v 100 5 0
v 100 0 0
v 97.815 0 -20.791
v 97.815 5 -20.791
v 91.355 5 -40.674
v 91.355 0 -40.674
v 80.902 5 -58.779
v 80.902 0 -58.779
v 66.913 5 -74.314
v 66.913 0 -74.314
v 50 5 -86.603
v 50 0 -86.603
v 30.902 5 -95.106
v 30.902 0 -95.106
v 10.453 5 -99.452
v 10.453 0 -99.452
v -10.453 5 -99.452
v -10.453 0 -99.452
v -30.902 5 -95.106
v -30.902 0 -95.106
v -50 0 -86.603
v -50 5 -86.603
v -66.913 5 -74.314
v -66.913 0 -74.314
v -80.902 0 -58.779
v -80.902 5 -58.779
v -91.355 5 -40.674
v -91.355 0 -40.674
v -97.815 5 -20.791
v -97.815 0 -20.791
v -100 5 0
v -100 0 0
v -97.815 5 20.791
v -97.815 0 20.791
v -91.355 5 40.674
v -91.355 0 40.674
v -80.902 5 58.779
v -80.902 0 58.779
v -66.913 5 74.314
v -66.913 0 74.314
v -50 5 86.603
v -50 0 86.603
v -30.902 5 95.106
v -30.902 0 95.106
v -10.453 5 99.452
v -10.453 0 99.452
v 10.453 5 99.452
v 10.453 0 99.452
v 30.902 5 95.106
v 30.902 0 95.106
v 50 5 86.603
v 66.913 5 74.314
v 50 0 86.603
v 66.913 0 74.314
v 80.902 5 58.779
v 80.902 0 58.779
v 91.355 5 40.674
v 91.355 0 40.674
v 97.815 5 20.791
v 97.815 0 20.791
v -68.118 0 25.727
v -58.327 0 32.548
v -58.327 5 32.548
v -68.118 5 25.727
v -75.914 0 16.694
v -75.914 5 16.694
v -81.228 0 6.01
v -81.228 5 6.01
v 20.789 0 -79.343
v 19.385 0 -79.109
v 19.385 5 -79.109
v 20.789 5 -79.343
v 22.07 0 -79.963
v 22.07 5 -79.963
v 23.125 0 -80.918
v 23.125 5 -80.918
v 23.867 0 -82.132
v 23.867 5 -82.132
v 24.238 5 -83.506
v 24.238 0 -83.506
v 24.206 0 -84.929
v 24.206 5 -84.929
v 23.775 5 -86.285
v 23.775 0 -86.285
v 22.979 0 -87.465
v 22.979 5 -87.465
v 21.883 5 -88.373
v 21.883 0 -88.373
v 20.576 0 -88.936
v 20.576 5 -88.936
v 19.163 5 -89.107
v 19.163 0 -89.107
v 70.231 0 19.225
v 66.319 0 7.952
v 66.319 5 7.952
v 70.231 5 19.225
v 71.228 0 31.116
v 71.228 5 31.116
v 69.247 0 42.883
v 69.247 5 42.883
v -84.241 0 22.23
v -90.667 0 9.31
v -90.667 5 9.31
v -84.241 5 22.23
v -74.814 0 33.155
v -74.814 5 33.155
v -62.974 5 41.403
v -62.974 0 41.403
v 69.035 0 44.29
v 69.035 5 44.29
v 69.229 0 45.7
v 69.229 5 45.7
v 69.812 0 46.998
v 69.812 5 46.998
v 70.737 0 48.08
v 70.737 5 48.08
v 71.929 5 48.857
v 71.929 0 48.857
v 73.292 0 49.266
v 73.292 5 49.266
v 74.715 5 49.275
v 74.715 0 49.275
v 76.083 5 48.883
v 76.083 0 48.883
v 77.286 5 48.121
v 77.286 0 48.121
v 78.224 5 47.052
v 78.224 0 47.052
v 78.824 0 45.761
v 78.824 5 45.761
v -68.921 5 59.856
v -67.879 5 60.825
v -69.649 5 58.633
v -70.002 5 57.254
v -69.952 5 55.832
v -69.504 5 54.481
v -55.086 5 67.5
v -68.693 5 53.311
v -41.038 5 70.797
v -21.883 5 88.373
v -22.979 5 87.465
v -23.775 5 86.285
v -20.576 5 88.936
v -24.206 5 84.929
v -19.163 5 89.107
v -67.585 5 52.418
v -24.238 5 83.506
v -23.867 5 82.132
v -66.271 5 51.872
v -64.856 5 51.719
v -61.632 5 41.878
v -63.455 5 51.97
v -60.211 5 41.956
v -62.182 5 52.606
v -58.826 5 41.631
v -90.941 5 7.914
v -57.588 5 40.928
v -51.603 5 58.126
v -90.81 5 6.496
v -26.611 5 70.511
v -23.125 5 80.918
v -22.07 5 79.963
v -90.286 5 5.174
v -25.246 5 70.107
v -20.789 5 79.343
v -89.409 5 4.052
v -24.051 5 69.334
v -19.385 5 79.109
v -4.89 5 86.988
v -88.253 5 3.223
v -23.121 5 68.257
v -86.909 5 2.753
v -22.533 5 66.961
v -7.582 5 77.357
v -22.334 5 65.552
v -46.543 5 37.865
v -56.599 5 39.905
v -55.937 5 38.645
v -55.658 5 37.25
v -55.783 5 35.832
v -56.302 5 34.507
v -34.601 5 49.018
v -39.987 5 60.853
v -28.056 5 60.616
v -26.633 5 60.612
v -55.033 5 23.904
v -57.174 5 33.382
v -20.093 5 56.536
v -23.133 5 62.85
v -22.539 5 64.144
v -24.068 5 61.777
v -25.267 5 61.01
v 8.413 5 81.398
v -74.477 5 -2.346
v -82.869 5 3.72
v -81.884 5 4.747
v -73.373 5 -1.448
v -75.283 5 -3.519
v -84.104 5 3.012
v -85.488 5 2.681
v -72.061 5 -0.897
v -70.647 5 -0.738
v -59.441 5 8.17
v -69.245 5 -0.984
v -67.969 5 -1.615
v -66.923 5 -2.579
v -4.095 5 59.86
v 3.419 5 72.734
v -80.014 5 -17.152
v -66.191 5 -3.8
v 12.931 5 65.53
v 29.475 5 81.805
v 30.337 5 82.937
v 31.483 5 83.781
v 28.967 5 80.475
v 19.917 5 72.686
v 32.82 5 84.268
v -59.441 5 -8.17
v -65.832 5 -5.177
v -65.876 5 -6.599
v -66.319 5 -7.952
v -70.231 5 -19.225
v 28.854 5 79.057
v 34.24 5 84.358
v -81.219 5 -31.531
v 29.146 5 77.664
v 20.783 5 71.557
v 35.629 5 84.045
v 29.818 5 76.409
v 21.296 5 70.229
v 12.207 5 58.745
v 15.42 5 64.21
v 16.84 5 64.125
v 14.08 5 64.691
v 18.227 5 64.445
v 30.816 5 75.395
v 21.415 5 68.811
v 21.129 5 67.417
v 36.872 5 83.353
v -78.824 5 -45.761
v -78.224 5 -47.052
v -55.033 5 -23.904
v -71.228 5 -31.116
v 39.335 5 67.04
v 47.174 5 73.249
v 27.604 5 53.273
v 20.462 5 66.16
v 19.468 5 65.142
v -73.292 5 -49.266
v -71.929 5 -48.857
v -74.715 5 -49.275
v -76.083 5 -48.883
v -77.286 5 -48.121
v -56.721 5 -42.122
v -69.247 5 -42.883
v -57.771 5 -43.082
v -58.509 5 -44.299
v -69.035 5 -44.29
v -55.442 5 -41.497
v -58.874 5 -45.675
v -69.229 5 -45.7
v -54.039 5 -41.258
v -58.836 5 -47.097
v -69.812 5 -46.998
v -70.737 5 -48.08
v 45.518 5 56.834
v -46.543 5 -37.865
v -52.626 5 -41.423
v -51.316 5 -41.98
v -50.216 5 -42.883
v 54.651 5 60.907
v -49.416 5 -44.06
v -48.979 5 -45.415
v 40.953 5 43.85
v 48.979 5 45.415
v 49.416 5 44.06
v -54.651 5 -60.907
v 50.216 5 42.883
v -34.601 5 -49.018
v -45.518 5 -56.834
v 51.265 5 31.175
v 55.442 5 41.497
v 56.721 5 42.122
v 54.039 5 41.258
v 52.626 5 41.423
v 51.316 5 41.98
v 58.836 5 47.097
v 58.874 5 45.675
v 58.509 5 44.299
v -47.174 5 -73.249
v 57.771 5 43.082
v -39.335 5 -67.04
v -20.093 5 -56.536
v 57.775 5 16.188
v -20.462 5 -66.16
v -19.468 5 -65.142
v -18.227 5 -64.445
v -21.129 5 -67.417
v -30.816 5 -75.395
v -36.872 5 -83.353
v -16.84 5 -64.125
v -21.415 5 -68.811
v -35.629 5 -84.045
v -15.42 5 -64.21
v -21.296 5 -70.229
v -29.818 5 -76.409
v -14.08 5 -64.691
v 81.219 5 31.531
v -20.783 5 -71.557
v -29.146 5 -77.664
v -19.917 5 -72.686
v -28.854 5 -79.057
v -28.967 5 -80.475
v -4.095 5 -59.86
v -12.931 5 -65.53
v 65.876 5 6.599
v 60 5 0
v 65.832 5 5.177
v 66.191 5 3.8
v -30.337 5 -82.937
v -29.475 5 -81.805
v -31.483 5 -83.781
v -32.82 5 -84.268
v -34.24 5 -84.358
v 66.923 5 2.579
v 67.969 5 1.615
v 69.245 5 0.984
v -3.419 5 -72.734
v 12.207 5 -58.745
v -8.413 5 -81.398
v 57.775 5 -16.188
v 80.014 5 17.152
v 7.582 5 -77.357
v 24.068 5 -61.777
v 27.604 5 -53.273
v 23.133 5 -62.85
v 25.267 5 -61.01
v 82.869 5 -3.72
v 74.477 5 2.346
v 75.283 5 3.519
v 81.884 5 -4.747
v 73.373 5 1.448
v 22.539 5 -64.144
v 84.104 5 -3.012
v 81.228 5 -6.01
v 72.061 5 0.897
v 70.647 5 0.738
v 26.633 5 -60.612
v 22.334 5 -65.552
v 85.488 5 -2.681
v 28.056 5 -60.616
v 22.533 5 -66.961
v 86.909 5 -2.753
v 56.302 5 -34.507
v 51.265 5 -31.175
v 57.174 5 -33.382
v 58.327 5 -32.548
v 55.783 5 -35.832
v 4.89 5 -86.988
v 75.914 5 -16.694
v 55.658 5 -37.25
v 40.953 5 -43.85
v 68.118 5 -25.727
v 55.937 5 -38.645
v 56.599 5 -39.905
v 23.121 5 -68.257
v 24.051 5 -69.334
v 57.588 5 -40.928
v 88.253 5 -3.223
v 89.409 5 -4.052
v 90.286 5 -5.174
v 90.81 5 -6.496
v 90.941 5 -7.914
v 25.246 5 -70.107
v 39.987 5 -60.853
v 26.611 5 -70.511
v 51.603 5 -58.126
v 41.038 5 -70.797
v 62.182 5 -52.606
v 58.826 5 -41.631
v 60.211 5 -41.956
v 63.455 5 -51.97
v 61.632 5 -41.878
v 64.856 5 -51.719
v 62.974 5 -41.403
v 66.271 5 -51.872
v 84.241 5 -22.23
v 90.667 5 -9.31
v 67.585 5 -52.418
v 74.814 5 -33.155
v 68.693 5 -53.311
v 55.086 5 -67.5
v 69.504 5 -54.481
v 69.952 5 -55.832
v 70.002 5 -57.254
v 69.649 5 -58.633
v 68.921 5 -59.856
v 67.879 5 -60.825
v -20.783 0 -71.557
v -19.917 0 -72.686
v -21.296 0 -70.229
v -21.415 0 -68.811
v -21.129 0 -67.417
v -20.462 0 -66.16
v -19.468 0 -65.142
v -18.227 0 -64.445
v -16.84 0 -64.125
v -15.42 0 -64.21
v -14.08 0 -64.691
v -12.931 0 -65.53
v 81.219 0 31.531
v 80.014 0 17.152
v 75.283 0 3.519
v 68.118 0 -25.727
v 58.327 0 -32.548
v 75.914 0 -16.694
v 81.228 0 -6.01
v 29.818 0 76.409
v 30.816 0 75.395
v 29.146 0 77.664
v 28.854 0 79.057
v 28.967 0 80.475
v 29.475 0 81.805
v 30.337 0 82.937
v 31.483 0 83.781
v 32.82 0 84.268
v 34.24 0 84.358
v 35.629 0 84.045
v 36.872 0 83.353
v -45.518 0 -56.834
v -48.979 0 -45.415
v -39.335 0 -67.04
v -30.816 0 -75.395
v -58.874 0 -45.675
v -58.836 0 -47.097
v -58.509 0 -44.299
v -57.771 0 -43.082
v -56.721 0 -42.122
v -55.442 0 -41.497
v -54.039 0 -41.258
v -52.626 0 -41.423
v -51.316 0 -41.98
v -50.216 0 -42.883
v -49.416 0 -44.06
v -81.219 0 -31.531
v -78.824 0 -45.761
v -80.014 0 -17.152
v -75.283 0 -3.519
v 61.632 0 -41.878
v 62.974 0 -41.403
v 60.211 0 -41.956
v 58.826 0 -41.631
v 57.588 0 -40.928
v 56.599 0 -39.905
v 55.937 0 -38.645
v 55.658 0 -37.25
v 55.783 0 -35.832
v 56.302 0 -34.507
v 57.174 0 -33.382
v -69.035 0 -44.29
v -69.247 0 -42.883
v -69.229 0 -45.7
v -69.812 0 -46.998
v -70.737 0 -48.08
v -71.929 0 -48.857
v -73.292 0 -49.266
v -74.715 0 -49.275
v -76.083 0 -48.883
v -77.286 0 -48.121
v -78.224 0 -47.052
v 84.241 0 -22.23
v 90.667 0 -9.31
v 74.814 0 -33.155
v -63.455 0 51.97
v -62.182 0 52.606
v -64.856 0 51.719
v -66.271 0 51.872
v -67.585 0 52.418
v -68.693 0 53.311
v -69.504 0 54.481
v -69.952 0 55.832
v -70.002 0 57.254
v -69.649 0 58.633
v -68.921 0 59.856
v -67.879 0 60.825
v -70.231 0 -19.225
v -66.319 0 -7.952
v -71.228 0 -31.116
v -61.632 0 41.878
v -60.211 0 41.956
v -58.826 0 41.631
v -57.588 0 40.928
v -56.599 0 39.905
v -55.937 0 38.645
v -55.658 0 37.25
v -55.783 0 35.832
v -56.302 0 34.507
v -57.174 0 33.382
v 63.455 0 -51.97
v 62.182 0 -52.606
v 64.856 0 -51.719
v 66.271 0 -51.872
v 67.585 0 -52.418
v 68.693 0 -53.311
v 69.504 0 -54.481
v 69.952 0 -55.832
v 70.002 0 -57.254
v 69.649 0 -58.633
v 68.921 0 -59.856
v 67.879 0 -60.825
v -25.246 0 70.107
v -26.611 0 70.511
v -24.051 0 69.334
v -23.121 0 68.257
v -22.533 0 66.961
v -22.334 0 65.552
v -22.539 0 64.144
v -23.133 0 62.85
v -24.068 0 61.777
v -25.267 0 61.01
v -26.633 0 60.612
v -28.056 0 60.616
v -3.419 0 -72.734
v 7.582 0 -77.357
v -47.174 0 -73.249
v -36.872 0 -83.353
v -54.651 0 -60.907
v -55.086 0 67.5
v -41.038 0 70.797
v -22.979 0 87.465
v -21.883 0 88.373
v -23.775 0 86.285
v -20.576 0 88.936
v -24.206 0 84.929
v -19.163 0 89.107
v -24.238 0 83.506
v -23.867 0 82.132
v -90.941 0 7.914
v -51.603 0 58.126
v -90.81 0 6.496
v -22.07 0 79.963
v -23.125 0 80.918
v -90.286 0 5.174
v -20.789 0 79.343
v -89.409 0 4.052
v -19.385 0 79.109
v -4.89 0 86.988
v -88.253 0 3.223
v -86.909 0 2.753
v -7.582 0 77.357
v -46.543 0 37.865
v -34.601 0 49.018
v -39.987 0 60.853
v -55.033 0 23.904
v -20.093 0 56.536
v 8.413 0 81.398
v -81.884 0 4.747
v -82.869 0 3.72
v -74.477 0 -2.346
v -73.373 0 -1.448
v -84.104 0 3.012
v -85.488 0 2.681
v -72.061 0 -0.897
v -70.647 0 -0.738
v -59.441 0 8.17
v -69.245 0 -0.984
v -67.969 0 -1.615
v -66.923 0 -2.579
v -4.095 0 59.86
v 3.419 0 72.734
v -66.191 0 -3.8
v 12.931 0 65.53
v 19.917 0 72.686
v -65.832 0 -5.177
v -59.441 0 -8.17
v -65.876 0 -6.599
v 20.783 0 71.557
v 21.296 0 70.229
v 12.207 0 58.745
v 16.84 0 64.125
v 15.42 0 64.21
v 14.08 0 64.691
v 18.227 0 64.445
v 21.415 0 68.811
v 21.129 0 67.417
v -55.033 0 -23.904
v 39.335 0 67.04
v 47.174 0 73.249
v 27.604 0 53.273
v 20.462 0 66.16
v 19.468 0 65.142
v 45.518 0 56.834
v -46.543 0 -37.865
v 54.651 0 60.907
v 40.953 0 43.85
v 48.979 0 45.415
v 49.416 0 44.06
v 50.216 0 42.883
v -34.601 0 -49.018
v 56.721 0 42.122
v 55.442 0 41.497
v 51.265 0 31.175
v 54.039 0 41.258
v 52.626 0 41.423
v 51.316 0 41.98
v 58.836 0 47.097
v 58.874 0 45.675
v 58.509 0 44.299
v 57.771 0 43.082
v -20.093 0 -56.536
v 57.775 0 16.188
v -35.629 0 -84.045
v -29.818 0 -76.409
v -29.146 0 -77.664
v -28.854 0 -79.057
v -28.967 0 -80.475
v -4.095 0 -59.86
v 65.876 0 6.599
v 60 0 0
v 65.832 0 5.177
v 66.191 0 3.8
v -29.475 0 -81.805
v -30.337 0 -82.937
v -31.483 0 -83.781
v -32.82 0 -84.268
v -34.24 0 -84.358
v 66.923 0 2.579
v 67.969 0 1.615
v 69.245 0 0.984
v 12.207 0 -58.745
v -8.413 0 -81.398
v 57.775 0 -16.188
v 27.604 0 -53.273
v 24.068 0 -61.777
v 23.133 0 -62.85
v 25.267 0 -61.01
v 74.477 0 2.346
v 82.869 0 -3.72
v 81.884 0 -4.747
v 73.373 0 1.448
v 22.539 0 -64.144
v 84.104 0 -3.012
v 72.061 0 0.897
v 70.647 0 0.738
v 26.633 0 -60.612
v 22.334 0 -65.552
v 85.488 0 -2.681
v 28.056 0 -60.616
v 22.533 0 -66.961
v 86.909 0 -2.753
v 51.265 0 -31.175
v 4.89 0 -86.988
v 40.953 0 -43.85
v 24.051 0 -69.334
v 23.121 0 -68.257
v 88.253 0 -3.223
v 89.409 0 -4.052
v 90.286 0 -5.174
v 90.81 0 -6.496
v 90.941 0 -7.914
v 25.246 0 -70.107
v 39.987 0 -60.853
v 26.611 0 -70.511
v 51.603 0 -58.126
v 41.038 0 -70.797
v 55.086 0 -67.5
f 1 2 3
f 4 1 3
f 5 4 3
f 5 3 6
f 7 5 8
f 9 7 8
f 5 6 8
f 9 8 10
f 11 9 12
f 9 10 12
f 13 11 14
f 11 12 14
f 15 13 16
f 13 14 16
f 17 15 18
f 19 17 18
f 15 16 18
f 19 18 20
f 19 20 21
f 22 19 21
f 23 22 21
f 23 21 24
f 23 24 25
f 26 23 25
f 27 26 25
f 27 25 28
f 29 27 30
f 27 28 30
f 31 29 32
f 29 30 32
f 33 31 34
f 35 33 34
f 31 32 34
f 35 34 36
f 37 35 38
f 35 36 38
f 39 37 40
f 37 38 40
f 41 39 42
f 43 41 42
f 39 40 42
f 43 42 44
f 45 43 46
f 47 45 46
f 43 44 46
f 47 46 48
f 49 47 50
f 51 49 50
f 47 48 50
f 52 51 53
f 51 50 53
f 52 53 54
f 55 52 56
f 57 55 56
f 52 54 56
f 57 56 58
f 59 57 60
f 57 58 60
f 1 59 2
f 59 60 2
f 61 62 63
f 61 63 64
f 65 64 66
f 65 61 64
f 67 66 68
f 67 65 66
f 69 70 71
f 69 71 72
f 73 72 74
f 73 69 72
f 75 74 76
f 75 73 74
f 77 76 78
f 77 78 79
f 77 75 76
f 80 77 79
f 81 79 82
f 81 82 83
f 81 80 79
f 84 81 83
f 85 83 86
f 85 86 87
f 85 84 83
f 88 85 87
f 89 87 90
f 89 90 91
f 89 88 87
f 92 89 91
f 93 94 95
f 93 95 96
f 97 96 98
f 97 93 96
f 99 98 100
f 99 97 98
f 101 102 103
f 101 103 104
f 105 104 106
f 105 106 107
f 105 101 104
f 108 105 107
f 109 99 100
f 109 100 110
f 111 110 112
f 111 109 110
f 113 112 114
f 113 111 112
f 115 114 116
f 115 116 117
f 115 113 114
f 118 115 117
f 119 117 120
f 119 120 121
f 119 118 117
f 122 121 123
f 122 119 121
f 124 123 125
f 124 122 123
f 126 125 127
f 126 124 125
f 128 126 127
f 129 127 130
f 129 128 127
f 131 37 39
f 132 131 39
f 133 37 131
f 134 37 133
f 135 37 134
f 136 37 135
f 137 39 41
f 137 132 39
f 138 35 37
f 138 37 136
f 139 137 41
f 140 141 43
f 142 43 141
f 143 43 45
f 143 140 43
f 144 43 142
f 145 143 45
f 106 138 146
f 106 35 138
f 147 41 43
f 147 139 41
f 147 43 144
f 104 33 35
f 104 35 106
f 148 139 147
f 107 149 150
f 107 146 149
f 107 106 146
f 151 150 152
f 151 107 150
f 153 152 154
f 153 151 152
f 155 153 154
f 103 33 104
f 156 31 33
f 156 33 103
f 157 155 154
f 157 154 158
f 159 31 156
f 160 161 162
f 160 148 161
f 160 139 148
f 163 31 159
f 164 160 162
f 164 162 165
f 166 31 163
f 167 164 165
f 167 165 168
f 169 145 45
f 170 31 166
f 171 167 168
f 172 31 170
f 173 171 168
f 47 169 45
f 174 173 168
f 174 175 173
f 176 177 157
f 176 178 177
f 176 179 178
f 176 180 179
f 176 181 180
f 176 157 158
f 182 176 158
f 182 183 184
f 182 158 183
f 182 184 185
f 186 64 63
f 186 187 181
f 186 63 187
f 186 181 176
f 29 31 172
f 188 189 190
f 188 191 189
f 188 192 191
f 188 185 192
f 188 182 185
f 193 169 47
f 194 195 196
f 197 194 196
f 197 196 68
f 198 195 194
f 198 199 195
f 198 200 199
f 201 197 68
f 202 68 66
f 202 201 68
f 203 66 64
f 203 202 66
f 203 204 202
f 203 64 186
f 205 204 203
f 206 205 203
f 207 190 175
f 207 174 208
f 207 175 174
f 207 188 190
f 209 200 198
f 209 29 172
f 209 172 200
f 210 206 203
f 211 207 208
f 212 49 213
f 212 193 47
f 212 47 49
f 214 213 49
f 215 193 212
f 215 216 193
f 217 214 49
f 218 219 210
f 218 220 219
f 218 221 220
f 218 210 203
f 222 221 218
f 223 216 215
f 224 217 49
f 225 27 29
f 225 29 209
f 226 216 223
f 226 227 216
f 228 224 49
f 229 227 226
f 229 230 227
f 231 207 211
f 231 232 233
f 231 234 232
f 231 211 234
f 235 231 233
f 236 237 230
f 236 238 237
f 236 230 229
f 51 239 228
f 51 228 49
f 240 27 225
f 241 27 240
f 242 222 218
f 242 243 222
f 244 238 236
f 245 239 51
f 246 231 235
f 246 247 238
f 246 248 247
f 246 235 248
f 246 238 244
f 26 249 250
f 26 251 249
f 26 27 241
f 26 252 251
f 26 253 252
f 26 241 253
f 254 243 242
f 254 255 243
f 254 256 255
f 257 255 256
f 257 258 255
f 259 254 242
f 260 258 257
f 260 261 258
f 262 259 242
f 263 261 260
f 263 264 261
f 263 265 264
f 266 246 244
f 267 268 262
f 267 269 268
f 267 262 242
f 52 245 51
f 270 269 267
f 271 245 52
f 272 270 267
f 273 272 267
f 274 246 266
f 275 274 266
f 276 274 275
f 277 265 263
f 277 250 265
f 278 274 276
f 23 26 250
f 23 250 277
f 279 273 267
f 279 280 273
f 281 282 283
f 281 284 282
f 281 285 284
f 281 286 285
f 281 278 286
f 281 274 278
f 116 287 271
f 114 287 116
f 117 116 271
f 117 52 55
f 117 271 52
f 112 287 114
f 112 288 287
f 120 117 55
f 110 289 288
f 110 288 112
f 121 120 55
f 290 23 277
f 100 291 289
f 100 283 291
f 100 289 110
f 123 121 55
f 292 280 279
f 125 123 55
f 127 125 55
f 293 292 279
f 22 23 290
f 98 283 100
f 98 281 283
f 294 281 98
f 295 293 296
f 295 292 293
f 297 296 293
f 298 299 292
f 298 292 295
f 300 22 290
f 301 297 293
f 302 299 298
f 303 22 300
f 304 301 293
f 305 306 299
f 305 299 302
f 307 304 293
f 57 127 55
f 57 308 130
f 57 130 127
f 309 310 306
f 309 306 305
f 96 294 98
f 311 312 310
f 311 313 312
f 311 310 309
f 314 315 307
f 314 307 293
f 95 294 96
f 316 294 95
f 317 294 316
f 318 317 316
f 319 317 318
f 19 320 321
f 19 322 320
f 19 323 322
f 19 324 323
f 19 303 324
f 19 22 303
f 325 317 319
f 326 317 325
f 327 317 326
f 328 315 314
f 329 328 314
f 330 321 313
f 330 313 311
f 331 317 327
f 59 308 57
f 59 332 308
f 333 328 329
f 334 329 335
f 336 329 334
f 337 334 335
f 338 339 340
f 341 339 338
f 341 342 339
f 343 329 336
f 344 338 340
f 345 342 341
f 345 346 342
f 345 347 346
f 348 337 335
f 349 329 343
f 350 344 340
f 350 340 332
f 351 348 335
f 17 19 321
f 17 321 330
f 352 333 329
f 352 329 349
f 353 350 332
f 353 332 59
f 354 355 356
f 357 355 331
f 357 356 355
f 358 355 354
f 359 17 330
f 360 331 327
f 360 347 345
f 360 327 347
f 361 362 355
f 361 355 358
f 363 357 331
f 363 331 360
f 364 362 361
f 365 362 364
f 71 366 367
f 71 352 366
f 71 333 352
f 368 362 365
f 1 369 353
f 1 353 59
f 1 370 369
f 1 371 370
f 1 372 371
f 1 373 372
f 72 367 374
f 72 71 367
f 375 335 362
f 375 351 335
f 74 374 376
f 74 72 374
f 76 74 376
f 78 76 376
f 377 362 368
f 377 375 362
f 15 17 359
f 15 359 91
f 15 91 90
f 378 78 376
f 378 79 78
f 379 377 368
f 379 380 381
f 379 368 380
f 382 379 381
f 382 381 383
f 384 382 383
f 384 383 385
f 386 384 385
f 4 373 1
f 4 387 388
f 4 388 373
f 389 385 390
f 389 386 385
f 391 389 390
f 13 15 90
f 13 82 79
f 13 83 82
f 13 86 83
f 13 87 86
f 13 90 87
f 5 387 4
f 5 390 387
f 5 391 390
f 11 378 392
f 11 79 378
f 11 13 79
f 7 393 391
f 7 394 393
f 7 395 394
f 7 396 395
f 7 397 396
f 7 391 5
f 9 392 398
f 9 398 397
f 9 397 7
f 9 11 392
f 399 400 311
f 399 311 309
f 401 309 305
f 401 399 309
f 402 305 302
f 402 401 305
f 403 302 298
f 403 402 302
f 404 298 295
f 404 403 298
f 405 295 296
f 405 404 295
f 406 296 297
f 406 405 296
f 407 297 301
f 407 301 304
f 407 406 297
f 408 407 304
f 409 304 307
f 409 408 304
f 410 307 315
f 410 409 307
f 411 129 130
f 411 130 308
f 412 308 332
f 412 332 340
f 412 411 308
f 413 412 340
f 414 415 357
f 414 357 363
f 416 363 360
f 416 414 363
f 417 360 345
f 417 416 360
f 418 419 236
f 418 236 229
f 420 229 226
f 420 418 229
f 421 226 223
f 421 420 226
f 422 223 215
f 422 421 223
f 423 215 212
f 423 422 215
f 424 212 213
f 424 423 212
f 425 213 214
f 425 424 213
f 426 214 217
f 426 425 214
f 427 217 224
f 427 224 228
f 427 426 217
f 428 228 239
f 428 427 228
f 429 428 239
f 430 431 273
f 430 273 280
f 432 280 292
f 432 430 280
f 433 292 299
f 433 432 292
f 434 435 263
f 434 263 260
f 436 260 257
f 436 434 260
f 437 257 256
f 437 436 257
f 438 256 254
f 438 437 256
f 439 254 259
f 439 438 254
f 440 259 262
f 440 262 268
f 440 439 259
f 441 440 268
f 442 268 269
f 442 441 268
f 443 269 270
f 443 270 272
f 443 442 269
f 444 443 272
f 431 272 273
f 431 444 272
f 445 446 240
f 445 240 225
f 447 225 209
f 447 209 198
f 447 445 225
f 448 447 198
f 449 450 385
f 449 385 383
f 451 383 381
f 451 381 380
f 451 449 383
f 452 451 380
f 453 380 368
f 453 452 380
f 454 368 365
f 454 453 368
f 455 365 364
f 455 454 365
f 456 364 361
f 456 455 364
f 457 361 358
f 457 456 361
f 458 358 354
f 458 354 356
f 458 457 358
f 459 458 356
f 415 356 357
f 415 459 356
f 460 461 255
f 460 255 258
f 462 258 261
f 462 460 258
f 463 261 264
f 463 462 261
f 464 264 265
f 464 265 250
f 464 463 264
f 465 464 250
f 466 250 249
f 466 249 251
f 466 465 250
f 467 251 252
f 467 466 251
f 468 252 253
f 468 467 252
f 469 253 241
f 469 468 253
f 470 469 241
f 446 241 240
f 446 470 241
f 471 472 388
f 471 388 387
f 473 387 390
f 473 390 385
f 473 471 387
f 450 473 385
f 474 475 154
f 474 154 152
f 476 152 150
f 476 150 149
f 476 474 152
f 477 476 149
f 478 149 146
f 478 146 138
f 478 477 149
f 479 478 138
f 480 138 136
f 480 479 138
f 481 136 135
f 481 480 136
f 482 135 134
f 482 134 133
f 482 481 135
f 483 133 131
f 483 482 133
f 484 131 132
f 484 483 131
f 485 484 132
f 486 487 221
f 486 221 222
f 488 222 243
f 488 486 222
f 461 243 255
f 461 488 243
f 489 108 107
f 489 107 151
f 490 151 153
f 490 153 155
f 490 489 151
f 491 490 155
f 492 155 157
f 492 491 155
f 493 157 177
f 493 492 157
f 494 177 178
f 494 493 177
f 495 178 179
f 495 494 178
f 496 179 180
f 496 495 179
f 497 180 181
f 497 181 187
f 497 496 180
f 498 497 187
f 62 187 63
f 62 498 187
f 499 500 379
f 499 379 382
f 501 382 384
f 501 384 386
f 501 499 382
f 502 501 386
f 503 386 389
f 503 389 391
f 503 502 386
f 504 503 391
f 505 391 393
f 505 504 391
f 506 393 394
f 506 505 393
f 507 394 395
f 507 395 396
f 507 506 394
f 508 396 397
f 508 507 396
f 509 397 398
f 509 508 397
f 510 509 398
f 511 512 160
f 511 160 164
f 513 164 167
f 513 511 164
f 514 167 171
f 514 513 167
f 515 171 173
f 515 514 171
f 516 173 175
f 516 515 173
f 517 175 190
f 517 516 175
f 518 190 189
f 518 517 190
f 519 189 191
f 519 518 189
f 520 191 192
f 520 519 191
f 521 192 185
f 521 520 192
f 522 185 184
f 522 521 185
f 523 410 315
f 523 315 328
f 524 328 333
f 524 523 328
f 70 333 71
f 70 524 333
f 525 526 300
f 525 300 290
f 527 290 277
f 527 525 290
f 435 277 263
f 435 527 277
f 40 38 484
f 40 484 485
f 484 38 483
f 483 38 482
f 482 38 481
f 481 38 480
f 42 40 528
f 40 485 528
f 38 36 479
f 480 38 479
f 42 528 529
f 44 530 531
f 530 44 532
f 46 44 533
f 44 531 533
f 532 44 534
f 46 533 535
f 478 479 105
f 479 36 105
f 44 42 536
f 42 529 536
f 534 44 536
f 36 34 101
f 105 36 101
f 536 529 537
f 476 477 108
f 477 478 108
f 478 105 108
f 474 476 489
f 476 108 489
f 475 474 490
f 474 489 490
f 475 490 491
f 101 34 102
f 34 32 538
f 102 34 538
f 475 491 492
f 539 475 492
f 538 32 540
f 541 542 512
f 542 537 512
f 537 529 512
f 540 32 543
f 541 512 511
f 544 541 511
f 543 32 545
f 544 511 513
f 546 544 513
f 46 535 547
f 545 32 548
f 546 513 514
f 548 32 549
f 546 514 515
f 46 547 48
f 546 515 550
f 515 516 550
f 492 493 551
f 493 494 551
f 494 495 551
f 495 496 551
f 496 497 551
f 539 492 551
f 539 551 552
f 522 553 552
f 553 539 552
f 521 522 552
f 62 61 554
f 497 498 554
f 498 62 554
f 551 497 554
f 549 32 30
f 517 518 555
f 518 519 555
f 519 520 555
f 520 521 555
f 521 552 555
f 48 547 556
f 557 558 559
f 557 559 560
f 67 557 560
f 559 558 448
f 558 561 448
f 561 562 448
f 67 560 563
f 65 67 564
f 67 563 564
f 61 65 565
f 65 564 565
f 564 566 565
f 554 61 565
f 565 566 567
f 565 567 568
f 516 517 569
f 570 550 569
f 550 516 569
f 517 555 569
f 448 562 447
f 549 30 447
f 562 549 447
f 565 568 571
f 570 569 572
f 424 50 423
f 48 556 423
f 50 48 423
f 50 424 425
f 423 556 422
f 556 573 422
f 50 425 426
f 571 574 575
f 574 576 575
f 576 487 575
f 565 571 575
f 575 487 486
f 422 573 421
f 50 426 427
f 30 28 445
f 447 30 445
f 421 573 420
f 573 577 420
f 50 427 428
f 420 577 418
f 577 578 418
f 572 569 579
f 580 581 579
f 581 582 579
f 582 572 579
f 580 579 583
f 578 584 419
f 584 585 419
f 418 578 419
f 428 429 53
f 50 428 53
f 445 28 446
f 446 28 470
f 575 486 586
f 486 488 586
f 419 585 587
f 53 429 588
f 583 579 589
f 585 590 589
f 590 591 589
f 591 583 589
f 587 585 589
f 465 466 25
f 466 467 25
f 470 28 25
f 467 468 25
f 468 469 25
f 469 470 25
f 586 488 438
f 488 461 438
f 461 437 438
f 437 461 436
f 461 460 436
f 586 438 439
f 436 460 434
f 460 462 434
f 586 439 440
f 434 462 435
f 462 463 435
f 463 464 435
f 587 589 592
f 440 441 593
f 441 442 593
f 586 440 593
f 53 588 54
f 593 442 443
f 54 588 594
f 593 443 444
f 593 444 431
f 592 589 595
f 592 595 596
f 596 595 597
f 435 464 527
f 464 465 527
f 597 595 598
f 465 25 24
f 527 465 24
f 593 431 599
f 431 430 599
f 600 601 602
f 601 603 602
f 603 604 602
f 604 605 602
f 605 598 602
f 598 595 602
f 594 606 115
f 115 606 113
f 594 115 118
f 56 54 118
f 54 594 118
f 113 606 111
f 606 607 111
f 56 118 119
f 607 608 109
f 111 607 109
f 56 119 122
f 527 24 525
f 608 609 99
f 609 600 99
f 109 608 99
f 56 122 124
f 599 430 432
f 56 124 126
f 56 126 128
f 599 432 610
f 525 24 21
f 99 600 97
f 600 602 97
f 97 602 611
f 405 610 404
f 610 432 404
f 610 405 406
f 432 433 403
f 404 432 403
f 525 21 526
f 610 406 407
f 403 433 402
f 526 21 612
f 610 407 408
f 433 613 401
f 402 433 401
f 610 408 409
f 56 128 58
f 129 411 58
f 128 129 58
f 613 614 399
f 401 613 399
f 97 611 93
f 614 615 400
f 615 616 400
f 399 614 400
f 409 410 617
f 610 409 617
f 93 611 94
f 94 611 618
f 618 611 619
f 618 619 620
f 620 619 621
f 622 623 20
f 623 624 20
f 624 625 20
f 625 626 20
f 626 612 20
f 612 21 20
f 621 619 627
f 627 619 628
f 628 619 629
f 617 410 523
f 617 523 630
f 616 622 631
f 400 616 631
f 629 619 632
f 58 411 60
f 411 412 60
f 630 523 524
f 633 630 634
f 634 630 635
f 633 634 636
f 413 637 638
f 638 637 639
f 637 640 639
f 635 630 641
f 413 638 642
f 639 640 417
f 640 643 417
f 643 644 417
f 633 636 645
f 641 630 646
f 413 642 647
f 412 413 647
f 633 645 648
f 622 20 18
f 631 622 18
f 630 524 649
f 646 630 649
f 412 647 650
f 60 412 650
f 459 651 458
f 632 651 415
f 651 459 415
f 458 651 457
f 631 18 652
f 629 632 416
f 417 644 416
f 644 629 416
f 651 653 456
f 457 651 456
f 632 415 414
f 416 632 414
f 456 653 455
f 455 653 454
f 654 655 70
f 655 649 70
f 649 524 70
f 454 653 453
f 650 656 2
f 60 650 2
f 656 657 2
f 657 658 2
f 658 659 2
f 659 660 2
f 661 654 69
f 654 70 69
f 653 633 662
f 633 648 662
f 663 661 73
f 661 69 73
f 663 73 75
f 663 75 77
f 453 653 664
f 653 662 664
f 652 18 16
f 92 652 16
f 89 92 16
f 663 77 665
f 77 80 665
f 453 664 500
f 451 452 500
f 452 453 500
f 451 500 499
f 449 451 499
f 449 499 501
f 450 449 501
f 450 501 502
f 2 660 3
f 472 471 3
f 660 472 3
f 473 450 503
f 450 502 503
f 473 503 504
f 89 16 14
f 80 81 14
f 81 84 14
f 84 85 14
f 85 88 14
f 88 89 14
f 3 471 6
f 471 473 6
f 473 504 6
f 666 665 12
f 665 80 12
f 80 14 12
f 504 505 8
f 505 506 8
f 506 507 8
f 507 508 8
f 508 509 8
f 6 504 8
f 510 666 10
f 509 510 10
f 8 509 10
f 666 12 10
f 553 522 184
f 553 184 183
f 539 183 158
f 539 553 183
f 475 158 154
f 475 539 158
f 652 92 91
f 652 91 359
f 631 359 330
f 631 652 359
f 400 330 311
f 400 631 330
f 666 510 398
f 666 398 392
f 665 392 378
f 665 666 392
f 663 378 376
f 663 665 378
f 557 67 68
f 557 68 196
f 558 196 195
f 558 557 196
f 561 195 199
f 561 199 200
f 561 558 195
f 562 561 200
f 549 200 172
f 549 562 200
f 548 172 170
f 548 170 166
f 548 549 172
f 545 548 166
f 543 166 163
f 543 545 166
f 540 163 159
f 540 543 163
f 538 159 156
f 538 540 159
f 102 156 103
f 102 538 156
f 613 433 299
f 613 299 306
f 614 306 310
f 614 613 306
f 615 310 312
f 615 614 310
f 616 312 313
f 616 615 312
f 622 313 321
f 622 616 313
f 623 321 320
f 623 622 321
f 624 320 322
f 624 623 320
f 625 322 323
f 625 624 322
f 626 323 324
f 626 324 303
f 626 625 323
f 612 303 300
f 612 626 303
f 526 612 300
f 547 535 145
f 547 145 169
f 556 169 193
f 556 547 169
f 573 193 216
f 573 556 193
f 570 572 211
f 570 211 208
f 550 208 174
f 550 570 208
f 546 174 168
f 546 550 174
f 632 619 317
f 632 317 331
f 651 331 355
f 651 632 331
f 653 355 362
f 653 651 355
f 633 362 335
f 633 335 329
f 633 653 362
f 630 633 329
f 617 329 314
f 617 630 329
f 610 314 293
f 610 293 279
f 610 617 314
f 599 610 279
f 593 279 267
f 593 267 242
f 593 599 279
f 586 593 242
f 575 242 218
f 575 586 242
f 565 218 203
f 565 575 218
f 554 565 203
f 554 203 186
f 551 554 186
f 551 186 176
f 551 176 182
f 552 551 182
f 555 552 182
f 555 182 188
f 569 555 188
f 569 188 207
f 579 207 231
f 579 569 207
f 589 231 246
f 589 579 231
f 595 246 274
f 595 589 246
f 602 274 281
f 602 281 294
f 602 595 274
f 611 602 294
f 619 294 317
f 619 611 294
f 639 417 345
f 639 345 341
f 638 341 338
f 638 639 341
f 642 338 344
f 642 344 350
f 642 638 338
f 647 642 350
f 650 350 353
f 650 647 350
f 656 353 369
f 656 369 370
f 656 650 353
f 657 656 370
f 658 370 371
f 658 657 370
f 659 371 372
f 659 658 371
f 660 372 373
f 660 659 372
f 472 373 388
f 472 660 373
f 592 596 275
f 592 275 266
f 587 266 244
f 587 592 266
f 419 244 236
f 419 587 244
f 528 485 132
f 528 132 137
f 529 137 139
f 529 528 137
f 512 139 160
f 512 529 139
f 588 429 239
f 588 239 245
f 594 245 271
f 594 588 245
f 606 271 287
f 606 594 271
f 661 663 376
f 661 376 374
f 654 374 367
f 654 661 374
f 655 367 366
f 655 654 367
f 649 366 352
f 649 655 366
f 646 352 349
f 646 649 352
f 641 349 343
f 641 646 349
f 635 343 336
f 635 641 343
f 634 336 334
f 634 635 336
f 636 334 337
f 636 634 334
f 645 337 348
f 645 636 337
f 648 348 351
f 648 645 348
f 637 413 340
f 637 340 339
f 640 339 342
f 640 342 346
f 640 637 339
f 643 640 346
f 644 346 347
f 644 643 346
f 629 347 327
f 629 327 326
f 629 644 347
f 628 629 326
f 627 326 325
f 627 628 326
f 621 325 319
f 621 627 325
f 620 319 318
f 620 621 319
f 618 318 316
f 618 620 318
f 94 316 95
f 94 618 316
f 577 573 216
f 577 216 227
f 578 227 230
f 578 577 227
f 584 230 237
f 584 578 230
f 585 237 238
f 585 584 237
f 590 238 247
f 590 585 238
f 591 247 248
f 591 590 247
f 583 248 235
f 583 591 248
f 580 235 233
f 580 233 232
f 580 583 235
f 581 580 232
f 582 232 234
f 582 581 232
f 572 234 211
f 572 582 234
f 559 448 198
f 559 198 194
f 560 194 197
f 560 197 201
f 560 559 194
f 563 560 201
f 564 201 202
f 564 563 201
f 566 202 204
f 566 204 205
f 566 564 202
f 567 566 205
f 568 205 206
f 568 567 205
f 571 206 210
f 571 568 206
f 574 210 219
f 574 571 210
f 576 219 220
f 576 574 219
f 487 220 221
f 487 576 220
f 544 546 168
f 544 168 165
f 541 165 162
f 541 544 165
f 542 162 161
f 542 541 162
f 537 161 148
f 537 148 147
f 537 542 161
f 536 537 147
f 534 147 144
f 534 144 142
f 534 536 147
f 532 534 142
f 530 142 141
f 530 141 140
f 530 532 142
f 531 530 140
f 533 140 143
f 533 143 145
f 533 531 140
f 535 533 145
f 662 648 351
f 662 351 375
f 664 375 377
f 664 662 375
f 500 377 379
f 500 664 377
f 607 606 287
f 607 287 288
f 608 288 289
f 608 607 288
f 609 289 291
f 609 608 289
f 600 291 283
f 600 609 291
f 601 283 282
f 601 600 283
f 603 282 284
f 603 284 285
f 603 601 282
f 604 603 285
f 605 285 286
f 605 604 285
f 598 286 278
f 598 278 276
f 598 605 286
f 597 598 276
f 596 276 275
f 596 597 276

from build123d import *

# Parameters (mm, degrees)
SKETCH2_R           = 100
SKETCH2_R_2         = 60
BOSS_EXTRUDE1_DEPTH = 5


with BuildPart() as part:
    # Sketch2 → Boss-Extrude1 (new body)
    with BuildSketch(Plane(origin=(0, 0, 0), x_dir=(1, 0, 0), z_dir=(0, 1, 0))):
        Circle(SKETCH2_R)
        Circle(SKETCH2_R_2, mode=Mode.SUBTRACT)
        with BuildLine():
            ThreePointArc((19.163333379, 89.106772861), (-1.936913189, 84.609595134), (-19.916532707, 72.685741114))
            ThreePointArc((-19.916532707, 72.685741114), (-20.001448799, 65.615183198), (-12.930890882, 65.530267106))
            ThreePointArc((-12.930890882, 65.530267106), (1.936913189, 75.390404866), (19.385243032, 79.109235359))
            ThreePointArc((19.385243032, 79.109235359), (24.273056956, 84.218958937), (19.163333379, 89.106772861))
        make_face(mode=Mode.SUBTRACT)
        with BuildLine():
            ThreePointArc((67.879109339, 60.824968814), (48.165276536, 69.589089358), (26.61079325, 70.510644013))
            ThreePointArc((26.61079325, 70.510644013), (22.386125019, 64.840354924), (28.056414107, 60.615686694))
            ThreePointArc((28.056414107, 60.615686694), (45.880363831, 59.853629742), (62.182232917, 52.606355851))
            ThreePointArc((62.182232917, 52.606355851), (69.139977609, 53.867224121), (67.879109339, 60.824968814))
        make_face(mode=Mode.SUBTRACT)
        with BuildLine():
            ThreePointArc((90.667372658, 9.310094044), (79.869967701, 27.987916693), (62.973700653, 41.402877466))
            ThreePointArc((62.973700653, 41.402877466), (56.222959957, 39.298714913), (58.32712251, 32.547974217))
            ThreePointArc((58.32712251, 32.547974217), (72.299074906, 21.454802407), (81.227723324, 6.009636433))
            ThreePointArc((81.227723324, 6.009636433), (87.597776797, 2.940040571), (90.667372658, 9.310094044))
        make_face(mode=Mode.SUBTRACT)
        with BuildLine():
            ThreePointArc((78.823781293, -45.760920212), (81.067045885, -24.303688874), (75.282794804, -3.51938104))
            ThreePointArc((75.282794804, -3.51938104), (68.584535139, -1.253698481), (66.31885258, -7.951958147))
            ThreePointArc((66.31885258, -7.951958147), (71.101996722, -25.139030226), (69.24698425, -42.882559843))
            ThreePointArc((69.24698425, -42.882559843), (72.596202587, -49.110138549), (78.823781293, -45.760920212))
        make_face(mode=Mode.SUBTRACT)
        with BuildLine():
            ThreePointArc((36.872184595, -83.352818303), (51.299267908, -67.312111343), (58.836420108, -47.097355608))
            ThreePointArc((58.836420108, -47.097355608), (54.749149001, -41.327241667), (48.97903506, -45.414512775))
            ThreePointArc((48.97903506, -45.414512775), (42.746372458, -62.130607757), (30.816250811, -75.395075784))
            ThreePointArc((30.816250811, -75.395075784), (29.865346443, -82.401913935), (36.872184595, -83.352818303))
        make_face(mode=Mode.SUBTRACT)
        with BuildLine():
            ThreePointArc((-19.163333379, -89.106772861), (1.936913189, -84.609595134), (19.916532707, -72.685741114))
            ThreePointArc((19.916532707, -72.685741114), (20.001448799, -65.615183198), (12.930890882, -65.530267106))
            ThreePointArc((12.930890882, -65.530267106), (-1.936913189, -75.390404866), (-19.385243032, -79.109235359))
            ThreePointArc((-19.385243032, -79.109235359), (-24.273056956, -84.218958937), (-19.163333379, -89.106772861))
        make_face(mode=Mode.SUBTRACT)
        with BuildLine():
            ThreePointArc((-67.879109339, -60.824968814), (-48.165276536, -69.589089358), (-26.61079325, -70.510644013))
            ThreePointArc((-26.61079325, -70.510644013), (-22.386125019, -64.840354924), (-28.056414107, -60.615686694))
            ThreePointArc((-28.056414107, -60.615686694), (-45.880363831, -59.853629742), (-62.182232917, -52.606355851))
            ThreePointArc((-62.182232917, -52.606355851), (-69.139977609, -53.867224121), (-67.879109339, -60.824968814))
        make_face(mode=Mode.SUBTRACT)
        with BuildLine():
            ThreePointArc((-90.667372658, -9.310094044), (-79.869967701, -27.987916693), (-62.973700653, -41.402877466))
            ThreePointArc((-62.973700653, -41.402877466), (-56.222959957, -39.298714913), (-58.32712251, -32.547974217))
            ThreePointArc((-58.32712251, -32.547974217), (-72.299074906, -21.454802407), (-81.227723324, -6.009636433))
            ThreePointArc((-81.227723324, -6.009636433), (-87.597776797, -2.940040571), (-90.667372658, -9.310094044))
        make_face(mode=Mode.SUBTRACT)
        with BuildLine():
            ThreePointArc((-78.823781293, 45.760920212), (-81.067045885, 24.303688874), (-75.282794804, 3.51938104))
            ThreePointArc((-75.282794804, 3.51938104), (-68.584535139, 1.253698481), (-66.31885258, 7.951958147))
            ThreePointArc((-66.31885258, 7.951958147), (-71.101996722, 25.139030226), (-69.24698425, 42.882559843))
            ThreePointArc((-69.24698425, 42.882559843), (-72.596202587, 49.110138549), (-78.823781293, 45.760920212))
        make_face(mode=Mode.SUBTRACT)
        with BuildLine():
            ThreePointArc((-36.872184595, 83.352818303), (-51.299267908, 67.312111343), (-58.836420108, 47.097355608))
            ThreePointArc((-58.836420108, 47.097355608), (-54.749149001, 41.327241667), (-48.97903506, 45.414512775))
            ThreePointArc((-48.97903506, 45.414512775), (-42.746372458, 62.130607757), (-30.816250811, 75.395075784))
            ThreePointArc((-30.816250811, 75.395075784), (-29.865346443, 82.401913935), (-36.872184595, 83.352818303))
        make_face(mode=Mode.SUBTRACT)
    extrude(amount=BOSS_EXTRUDE1_DEPTH)


solid = part.part
